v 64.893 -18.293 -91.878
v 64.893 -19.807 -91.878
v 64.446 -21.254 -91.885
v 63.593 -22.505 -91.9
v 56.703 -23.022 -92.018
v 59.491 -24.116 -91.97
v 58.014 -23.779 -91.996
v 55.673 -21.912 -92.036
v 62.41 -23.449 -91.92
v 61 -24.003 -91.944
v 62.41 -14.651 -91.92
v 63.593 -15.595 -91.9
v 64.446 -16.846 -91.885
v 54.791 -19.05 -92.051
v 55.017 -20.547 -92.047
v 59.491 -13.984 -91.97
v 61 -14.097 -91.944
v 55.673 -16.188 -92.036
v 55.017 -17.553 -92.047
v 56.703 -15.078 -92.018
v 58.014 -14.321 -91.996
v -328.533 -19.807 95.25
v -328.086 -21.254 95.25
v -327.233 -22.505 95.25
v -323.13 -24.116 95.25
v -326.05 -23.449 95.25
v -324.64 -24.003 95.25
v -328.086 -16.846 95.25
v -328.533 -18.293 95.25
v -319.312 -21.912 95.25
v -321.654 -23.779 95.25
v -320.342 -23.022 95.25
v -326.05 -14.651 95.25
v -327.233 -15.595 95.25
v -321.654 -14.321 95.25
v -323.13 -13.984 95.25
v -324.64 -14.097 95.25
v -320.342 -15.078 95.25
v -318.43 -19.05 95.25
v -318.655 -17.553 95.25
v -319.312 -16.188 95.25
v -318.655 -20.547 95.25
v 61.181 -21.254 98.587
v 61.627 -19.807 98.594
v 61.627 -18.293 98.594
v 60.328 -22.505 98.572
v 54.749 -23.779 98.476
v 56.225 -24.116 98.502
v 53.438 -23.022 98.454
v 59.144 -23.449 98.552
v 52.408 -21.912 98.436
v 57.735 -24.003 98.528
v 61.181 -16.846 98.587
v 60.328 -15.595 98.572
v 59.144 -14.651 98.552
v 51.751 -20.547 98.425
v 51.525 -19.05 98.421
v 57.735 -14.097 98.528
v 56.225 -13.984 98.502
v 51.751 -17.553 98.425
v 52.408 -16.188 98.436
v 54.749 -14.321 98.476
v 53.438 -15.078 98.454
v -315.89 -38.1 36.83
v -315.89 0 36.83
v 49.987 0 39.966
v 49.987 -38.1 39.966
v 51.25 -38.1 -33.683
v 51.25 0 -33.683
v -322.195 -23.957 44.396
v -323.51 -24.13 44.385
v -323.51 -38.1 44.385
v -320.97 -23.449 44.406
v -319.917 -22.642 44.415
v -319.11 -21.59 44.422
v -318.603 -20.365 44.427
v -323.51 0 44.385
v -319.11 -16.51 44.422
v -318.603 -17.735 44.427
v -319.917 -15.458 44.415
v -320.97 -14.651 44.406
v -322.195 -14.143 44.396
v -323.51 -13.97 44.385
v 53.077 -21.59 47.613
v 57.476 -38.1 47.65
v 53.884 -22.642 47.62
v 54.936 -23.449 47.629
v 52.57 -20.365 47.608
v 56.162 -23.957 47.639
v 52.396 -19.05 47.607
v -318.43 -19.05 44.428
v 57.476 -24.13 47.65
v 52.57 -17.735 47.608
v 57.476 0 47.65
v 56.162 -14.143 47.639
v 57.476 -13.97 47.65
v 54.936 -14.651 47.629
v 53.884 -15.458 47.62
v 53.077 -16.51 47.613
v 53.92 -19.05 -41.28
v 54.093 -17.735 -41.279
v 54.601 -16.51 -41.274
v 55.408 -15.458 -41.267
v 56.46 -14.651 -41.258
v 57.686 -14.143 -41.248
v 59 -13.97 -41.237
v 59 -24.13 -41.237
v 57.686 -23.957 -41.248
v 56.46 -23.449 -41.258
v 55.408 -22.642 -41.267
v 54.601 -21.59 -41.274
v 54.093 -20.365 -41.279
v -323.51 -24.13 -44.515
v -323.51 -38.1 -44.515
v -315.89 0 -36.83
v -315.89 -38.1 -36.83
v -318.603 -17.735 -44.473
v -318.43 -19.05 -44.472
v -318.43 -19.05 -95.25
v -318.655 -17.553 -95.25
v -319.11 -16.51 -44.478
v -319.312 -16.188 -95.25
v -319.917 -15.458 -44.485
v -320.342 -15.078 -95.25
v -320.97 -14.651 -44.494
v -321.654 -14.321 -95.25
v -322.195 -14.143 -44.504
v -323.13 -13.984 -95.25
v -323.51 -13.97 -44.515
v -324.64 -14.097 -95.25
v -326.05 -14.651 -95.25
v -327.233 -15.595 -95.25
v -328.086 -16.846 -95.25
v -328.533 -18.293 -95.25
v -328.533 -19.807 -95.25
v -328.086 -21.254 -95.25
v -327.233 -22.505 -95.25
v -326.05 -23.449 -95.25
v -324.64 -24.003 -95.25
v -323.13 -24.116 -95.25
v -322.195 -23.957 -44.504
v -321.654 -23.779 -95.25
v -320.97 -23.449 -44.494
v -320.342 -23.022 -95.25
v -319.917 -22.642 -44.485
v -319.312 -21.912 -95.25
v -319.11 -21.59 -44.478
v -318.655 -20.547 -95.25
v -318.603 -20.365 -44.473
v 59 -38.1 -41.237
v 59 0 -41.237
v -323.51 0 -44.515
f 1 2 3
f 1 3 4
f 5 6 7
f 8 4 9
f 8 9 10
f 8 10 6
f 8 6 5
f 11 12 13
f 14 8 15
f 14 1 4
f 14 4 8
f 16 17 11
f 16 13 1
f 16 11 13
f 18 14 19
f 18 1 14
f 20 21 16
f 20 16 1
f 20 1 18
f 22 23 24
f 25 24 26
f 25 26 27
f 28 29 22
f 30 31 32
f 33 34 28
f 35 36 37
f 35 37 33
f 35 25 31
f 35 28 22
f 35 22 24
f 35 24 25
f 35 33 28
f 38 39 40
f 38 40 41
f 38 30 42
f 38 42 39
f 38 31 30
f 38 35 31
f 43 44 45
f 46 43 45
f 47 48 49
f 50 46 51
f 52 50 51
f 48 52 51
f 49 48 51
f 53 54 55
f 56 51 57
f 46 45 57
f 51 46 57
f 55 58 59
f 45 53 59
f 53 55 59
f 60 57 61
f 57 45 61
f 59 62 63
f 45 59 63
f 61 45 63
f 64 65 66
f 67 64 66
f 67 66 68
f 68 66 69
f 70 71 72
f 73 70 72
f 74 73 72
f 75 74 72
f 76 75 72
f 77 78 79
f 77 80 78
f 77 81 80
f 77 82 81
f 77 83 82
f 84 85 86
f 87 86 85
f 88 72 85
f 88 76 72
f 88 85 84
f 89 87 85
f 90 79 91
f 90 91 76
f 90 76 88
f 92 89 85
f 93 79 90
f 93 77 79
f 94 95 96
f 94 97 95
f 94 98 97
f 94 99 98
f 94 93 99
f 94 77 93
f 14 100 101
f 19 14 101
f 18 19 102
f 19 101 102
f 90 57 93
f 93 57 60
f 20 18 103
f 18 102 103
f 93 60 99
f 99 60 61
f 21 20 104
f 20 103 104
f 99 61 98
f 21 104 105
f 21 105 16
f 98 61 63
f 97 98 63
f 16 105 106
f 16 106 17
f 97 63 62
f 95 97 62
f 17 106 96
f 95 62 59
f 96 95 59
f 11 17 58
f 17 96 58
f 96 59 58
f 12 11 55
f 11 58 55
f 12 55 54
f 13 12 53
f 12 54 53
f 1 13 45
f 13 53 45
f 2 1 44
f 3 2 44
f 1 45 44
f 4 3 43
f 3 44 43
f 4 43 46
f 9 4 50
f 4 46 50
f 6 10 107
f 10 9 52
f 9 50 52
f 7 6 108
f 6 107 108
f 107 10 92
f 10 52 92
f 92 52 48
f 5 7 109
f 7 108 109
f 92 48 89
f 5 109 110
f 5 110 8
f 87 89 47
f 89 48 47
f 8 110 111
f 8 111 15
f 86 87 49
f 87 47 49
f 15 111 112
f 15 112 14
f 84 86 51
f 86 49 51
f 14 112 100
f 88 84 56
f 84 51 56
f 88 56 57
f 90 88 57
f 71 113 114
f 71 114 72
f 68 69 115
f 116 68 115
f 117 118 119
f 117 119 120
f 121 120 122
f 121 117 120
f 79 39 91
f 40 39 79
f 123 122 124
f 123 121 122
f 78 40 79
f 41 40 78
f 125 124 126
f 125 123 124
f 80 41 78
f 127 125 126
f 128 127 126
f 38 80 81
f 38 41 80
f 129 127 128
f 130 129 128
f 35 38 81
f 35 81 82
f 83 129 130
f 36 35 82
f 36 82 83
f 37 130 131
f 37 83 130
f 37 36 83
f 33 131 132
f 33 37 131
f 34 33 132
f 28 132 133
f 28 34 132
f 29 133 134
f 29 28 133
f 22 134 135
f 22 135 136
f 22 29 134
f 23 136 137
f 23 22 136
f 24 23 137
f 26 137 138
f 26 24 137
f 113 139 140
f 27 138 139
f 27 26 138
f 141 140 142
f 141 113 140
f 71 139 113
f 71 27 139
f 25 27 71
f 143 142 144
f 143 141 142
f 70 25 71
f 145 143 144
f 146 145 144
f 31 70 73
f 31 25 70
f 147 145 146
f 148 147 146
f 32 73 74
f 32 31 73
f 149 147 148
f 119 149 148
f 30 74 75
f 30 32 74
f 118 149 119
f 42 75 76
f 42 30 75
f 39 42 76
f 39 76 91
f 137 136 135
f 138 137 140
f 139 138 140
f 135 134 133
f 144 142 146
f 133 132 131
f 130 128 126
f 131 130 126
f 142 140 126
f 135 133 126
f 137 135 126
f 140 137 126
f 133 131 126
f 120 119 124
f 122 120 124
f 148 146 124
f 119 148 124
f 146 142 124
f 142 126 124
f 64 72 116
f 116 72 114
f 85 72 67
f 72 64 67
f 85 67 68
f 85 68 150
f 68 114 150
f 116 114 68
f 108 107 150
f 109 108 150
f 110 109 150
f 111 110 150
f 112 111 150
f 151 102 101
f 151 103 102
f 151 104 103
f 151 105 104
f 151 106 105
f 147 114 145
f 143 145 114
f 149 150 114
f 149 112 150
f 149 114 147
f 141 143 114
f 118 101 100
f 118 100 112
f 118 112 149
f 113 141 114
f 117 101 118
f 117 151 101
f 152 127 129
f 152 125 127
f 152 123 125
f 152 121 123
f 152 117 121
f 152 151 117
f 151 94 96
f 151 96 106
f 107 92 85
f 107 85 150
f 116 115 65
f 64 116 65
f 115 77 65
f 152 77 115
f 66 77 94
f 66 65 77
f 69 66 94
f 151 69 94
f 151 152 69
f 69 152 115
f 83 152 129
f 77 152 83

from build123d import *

# Parameters (mm, degrees)
BOSS_EXTRUDE1_DEPTH = 38.1
SKETCH2_R           = 5.08
BOSS_EXTRUDE2_DEPTH = 95.25


with BuildPart() as part:
    # Sketch1 → Boss-Extrude1 (new body)
    with BuildSketch(Plane(origin=(0, 0, 0), x_dir=(1, 0, 0), z_dir=(0, 1, 0))):
        Polygon((-323.509548329, -44.384683315), (57.476455496, -47.650397601), (59.000399511, 41.236539542), (-323.509548329, 44.515316685), align=None)
        Polygon((-315.889548329, -36.829720066), (49.987084067, -39.965920696), (51.24977094, 33.682696008), (-315.889548329, 36.829720066), align=None, mode=Mode.SUBTRACT)
    extrude(amount=-BOSS_EXTRUDE1_DEPTH)

    # Sketch2 → Boss-Extrude2 (add, symmetric)
    with BuildSketch(Plane.XY):
        with Locations((-323.509548329, -19.05)):
            Circle(SKETCH2_R)
    boss_extrude2 = extrude(amount=BOSS_EXTRUDE2_DEPTH, both=True)

    # Mirror1: Boss-Extrude2 across plane
    add(boss_extrude2.mirror(Plane(origin=(-132.612352201, 0, -1.136719062), x_dir=(-0.008571428571427947, 0, 0.9999632646313789), z_dir=(0.999963264631379, 0, 0.008571428571427946))))


solid = part.part
